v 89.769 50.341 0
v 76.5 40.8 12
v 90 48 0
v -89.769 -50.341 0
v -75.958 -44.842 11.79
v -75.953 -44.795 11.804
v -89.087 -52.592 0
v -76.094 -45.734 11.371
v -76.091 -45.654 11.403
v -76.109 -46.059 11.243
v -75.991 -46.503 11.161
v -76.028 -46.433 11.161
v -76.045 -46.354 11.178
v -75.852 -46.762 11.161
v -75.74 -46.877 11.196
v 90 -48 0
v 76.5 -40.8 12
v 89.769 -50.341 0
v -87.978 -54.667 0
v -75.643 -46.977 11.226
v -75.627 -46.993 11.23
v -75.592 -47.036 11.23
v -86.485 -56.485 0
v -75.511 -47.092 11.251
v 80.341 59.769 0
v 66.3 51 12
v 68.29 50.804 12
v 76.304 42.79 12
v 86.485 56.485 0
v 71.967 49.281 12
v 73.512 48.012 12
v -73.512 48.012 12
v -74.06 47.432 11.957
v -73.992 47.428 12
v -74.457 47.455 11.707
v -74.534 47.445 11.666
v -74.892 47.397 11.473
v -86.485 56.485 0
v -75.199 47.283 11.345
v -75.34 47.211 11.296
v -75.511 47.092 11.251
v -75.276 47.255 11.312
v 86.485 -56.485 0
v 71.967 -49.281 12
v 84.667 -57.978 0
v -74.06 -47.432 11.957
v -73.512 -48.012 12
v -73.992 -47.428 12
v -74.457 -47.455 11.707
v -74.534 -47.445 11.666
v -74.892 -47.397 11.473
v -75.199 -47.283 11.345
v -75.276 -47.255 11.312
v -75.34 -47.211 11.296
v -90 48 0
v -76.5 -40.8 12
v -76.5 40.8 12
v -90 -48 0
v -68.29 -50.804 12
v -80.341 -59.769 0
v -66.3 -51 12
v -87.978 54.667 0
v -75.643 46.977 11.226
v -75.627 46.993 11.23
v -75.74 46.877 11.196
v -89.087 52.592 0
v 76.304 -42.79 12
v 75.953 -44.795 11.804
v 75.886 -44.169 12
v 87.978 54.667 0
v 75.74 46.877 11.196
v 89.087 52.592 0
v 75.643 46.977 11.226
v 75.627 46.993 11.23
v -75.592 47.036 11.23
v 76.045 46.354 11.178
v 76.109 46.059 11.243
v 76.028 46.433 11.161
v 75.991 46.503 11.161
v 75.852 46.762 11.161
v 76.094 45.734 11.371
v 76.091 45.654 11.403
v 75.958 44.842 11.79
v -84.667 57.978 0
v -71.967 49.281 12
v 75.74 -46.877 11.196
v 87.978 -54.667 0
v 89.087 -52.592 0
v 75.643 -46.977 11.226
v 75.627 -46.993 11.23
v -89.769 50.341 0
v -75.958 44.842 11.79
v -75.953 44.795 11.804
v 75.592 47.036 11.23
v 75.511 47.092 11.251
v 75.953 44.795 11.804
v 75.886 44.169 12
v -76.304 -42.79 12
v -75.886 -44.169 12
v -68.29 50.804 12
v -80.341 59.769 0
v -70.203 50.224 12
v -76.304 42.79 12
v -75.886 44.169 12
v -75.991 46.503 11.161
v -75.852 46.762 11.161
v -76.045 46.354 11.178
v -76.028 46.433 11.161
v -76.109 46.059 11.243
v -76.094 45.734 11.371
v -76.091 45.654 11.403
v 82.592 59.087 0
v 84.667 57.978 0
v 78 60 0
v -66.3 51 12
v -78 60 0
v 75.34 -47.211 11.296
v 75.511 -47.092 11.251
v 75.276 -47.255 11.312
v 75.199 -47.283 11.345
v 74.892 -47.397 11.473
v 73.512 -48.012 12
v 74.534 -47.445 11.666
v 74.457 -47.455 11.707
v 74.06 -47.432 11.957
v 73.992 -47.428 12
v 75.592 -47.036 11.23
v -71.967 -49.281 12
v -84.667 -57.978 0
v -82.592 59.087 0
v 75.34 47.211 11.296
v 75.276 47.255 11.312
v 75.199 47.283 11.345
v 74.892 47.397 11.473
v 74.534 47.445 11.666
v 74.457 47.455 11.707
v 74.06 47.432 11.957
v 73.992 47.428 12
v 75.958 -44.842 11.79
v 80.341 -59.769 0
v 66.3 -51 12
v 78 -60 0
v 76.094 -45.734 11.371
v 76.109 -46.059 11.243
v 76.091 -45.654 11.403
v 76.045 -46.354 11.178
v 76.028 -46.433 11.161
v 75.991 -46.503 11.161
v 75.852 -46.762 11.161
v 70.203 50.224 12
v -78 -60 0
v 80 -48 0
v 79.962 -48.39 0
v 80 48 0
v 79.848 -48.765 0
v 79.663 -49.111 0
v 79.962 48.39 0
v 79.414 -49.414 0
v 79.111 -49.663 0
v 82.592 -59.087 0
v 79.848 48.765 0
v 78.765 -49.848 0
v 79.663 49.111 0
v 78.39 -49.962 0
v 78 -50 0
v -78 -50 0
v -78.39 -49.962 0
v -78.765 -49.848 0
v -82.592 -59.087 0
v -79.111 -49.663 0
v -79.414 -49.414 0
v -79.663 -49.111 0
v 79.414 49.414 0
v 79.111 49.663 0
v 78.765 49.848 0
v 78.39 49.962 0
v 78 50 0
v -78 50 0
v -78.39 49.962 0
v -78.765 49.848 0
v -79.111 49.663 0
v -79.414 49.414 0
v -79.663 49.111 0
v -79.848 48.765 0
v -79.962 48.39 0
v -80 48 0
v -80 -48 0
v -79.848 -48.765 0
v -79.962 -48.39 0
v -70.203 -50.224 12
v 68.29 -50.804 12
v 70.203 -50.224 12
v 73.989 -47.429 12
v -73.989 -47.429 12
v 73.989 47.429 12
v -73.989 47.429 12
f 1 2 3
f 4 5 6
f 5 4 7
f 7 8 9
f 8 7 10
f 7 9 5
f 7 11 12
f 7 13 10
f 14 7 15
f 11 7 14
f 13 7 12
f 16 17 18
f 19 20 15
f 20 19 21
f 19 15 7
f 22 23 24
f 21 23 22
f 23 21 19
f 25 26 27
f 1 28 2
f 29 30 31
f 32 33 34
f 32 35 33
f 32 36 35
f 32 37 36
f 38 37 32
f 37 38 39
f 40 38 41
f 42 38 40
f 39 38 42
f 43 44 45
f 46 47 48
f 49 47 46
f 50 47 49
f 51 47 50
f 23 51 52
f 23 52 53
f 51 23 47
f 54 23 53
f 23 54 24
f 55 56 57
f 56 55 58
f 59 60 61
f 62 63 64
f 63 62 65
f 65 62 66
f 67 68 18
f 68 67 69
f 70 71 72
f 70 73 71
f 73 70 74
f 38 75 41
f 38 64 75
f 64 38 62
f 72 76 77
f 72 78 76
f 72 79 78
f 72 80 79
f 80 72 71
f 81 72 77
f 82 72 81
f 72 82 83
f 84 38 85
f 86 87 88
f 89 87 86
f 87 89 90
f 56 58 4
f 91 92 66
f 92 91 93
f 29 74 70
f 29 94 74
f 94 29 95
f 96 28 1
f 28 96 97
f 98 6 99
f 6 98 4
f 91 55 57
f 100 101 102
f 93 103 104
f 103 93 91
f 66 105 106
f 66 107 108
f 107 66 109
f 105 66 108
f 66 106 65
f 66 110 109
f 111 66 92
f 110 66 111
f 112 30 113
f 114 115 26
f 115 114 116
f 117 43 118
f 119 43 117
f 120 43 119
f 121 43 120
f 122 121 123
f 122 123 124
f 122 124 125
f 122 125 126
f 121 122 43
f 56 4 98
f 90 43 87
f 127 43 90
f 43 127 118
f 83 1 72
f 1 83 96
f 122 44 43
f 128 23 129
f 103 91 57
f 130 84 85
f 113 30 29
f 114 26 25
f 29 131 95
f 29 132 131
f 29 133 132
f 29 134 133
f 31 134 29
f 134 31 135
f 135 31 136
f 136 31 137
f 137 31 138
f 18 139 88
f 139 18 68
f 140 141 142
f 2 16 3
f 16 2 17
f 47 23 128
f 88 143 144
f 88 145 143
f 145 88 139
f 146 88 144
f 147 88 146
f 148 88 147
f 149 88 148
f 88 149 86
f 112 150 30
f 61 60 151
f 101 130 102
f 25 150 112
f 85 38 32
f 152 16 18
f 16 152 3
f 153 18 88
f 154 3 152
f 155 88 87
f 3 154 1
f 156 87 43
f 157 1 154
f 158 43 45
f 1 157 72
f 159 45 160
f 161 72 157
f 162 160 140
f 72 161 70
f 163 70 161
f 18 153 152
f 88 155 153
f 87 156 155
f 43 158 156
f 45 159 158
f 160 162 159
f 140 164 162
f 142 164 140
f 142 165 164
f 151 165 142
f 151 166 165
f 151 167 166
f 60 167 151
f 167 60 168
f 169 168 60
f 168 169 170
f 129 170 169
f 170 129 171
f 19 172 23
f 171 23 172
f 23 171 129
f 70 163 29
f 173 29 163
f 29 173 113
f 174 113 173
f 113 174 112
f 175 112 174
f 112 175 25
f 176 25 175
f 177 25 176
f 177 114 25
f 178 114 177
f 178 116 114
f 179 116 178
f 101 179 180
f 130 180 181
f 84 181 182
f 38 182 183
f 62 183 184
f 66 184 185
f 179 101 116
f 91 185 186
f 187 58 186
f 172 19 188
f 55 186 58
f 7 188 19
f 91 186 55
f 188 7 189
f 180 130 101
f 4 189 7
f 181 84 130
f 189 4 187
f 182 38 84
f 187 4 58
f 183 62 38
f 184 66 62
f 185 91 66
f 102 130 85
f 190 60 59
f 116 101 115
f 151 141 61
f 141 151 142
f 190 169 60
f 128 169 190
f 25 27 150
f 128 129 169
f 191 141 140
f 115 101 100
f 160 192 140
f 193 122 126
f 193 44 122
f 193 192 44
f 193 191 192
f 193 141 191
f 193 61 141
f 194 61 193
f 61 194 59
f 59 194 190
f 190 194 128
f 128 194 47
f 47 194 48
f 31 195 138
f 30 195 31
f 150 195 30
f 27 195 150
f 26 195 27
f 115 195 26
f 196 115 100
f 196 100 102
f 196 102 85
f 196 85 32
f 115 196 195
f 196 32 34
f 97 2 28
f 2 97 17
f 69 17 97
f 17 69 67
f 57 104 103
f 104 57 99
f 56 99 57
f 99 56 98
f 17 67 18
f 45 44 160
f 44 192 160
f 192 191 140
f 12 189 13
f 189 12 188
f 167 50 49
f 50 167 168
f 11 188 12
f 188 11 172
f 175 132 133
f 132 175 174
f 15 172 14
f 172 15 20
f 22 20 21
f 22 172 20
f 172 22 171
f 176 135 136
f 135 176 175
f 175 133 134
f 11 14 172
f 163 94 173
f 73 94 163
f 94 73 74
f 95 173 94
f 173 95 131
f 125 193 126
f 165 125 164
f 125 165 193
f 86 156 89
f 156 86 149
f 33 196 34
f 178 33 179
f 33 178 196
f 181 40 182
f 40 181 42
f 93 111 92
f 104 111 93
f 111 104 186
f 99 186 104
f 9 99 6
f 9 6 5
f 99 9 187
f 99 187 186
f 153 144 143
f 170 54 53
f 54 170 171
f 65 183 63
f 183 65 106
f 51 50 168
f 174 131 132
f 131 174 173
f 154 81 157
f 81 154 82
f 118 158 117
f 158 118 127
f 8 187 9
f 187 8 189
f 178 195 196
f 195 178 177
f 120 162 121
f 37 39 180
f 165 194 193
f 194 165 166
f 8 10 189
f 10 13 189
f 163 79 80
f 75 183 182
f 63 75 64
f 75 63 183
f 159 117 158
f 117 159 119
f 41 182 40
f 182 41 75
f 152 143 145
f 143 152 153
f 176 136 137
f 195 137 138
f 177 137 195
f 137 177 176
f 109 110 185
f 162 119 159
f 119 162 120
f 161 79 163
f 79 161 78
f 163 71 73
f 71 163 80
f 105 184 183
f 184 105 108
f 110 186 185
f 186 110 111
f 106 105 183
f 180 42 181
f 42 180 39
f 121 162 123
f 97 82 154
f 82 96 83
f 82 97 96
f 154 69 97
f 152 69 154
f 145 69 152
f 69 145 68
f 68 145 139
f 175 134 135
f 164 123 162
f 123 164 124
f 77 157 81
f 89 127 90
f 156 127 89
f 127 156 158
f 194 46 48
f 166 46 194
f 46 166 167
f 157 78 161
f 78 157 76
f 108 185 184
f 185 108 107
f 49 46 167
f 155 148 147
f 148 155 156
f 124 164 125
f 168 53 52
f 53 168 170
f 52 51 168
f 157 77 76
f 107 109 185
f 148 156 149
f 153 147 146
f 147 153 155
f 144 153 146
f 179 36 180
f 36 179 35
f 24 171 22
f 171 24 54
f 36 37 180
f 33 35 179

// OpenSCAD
$fn = 32;

// ----------------------------------------------------------------------
// Display bezel: 180 x 120 mm frame, opening 160x100 mm
// ----------------------------------------------------------------------

// --- parameters (mm) ---
length = 180;             // frame outside length, X
width = 120;              // frame outside width, Y
frame_w = 10;             // frame width
thickness = 12;           // frame thickness
corner_r = 12;            // outside corner radius
chamfer = 0.85;           // outer wall taper
funnel = 0.94;            // inner opening taper
opening_l = 160;          // opening length
opening_w = 100;          // opening width
inner_r = 2;              // opening corner radius

/* rounded-rectangle outlines, generated with loops */
module rounded_ring(l_nom, w_nom, r) {
  hull() {
    for (sx = [-1, 1]) for (sy = [-1, 1])
      translate([sx * (l_nom / 2 - r), sy * (w_nom / 2 - r)]) circle(r = r);
  }
}

difference() {
  /* frame body, drafted so the outer edge is a variable-depth chamfer */
  linear_extrude(height = thickness, scale = chamfer)
    rounded_ring(length, width, corner_r);
  /* viewing opening, drafted the other way for a funnel edge */
  linear_extrude(height = thickness + 2, scale = funnel)
    translate([0, 0, -1]) rounded_ring(opening_l, opening_w, inner_r);
}
